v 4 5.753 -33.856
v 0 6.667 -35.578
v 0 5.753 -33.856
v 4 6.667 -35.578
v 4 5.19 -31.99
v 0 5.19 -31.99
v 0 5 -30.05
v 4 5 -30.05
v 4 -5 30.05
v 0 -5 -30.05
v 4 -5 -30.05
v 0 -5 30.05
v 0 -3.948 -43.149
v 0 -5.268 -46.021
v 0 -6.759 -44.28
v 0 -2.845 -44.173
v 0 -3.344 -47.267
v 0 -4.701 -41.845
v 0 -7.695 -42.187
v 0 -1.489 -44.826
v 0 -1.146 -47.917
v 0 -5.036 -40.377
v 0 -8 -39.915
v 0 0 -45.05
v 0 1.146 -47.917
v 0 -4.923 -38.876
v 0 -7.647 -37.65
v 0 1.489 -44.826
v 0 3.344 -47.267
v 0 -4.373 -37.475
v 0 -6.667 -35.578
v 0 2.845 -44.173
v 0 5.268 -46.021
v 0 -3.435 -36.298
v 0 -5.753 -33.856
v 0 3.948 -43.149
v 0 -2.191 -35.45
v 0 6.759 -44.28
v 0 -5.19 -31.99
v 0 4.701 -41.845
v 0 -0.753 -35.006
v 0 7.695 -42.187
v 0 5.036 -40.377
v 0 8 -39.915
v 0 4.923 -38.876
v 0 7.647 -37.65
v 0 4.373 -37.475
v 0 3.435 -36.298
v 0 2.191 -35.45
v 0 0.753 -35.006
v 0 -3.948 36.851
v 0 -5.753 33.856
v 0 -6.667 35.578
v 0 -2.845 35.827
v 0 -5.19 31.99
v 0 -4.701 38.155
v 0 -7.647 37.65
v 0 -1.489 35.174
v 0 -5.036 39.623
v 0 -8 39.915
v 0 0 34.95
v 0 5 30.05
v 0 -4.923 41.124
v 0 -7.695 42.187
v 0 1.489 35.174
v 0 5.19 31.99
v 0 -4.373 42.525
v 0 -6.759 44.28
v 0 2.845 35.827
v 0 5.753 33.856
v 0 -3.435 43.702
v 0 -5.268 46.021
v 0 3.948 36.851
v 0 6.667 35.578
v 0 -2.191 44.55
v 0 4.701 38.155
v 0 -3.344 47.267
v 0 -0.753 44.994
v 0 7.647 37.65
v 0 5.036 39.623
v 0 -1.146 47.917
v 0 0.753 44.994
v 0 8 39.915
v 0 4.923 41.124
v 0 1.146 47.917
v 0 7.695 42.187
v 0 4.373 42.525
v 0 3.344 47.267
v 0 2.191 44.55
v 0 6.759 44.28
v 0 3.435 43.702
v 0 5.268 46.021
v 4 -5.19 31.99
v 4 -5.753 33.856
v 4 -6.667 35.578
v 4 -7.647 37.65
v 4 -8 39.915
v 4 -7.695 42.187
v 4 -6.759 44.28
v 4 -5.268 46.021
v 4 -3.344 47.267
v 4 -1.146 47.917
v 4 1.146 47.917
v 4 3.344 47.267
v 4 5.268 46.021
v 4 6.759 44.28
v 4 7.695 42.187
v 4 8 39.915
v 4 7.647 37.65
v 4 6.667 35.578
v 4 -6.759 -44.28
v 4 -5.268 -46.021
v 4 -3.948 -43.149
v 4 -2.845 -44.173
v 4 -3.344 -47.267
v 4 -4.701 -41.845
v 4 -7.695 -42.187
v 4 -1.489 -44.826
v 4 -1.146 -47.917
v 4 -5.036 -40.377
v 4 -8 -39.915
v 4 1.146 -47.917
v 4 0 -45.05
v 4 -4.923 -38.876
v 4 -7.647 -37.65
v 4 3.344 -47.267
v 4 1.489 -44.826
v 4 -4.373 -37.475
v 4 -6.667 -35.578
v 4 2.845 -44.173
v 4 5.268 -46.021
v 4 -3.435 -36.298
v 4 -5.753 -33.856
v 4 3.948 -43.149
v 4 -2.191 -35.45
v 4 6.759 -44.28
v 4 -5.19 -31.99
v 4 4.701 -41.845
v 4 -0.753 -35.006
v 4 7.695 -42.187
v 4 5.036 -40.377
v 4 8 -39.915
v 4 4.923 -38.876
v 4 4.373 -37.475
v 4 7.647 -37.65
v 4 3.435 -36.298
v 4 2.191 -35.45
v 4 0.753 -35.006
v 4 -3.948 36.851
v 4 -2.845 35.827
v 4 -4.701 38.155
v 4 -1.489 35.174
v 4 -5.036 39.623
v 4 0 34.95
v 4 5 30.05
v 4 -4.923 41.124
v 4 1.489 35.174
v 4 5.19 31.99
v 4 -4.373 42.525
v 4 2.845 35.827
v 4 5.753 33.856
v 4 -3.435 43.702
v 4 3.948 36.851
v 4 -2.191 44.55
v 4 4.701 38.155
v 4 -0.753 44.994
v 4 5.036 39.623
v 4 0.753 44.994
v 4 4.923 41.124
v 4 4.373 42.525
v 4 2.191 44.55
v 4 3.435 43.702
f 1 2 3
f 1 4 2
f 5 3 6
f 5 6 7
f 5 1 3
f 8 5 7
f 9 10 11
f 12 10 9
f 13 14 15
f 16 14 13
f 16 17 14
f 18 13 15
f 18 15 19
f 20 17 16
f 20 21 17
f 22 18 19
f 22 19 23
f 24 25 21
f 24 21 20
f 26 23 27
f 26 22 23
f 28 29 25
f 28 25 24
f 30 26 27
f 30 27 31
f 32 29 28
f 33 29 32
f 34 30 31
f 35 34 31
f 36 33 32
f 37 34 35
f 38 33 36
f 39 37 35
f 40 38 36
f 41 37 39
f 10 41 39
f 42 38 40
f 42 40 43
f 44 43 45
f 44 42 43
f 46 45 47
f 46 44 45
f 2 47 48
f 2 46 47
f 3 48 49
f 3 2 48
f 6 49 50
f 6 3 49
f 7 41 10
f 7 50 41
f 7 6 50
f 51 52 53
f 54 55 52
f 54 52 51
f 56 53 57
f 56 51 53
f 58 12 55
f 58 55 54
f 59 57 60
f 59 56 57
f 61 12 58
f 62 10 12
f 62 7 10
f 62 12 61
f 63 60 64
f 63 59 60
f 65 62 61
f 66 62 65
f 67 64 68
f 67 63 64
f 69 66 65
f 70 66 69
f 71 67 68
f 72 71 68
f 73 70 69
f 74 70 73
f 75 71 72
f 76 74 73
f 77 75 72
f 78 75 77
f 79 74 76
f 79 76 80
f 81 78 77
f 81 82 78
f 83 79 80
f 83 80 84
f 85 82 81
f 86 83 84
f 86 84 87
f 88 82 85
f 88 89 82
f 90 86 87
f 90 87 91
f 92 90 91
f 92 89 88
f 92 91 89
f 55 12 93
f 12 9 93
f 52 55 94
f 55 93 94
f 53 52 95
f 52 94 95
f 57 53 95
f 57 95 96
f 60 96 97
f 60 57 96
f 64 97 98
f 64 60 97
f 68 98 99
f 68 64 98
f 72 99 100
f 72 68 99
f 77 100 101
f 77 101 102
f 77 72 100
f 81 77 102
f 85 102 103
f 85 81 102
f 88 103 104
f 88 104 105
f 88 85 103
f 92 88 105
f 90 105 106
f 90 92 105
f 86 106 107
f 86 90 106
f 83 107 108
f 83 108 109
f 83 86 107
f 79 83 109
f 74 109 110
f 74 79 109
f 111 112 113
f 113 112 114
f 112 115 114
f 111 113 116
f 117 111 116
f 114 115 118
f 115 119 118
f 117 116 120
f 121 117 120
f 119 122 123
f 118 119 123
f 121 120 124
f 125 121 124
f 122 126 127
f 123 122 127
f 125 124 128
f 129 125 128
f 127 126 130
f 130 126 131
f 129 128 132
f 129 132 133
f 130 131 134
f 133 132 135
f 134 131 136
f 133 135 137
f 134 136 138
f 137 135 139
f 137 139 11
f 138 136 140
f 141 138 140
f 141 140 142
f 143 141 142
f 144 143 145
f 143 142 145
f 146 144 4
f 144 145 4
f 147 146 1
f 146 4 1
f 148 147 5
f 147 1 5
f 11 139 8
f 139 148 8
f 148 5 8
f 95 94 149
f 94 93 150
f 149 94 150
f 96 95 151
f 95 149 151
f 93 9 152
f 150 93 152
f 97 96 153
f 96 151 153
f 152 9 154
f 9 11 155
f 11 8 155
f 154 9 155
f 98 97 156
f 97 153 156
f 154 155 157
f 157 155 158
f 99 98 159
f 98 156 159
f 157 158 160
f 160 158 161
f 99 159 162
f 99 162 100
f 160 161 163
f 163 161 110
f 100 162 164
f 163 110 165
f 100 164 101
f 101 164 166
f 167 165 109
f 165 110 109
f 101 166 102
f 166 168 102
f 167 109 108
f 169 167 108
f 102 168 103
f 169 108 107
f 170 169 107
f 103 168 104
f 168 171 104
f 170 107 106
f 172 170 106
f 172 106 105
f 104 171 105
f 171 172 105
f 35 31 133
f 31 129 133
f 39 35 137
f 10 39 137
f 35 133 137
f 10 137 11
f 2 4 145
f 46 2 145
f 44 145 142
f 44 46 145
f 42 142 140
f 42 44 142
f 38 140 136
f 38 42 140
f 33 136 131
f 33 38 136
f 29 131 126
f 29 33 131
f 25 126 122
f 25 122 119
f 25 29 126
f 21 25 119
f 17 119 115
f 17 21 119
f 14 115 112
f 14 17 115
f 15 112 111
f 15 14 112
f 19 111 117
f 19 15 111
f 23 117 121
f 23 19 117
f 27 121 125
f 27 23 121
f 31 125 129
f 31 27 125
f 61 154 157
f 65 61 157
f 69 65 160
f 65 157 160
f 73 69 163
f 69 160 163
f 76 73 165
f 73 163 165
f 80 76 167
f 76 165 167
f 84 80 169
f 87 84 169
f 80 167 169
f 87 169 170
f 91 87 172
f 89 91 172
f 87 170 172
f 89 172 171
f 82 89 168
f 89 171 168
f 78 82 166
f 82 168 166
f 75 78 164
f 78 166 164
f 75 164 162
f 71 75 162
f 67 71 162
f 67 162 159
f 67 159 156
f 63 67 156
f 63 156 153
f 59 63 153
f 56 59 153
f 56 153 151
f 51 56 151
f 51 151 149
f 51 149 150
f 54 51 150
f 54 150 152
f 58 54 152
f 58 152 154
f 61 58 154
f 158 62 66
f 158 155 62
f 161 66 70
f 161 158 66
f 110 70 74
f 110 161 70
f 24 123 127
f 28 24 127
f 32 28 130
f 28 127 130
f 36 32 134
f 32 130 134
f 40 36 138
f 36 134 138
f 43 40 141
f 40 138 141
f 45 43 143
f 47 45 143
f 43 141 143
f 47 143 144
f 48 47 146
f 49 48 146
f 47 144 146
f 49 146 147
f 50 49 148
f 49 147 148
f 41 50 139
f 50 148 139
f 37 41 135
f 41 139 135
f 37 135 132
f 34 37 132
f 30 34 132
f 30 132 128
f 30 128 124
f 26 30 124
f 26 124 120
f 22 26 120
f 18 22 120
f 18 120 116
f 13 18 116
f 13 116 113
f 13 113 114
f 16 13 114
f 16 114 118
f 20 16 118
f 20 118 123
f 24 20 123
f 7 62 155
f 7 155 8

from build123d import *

# Parameters (mm, degrees)
BOSS_EXTRU_1_DEPTH      = 4
ESQUISSE2_R             = 5.05
ENL_V_MAT_EXTRU_1_DEPTH = 10
CONG_1_R                = 10


with BuildPart() as part:
    # Esquisse1 → Boss.-Extru.1 (new body)
    with BuildSketch(Plane(origin=(0, 0, 0), x_dir=(0, 0, -1), z_dir=(1, 0, 0))):
        with BuildLine():
            ThreePointArc((33.755002002, 5), (48, 0), (33.755002002, -5))
            Line((33.755002002, -5), (-33.755002002, -5))
            ThreePointArc((-33.755002002, -5), (-48, 0), (-33.755002002, 5))
            Line((-33.755002002, 5), (33.755002002, 5))
        make_face()
    extrude(amount=BOSS_EXTRU_1_DEPTH)

    # Esquisse2 → Enlèv. mat.-Extru.1 (cut)
    with BuildSketch(Plane(origin=(4, 0, 0), x_dir=(0, 0, -1), z_dir=(1, 0, 0))):
        with Locations((-40, 0)):
            Circle(ESQUISSE2_R)
        with Locations((40, 0)):
            Circle(ESQUISSE2_R)
    extrude(amount=-ENL_V_MAT_EXTRU_1_DEPTH, mode=Mode.SUBTRACT)

    # Congé1
    cong_1_edges = [part.edges().sort_by_distance(p)[0] for p in [
        (2, -5, 33.755002002),
        (2, 5, 33.755002002),
        (2, 5, -33.755002002),
        (2, -5, -33.755002002),
    ]]
    fillet(cong_1_edges, radius=CONG_1_R)


solid = part.part
